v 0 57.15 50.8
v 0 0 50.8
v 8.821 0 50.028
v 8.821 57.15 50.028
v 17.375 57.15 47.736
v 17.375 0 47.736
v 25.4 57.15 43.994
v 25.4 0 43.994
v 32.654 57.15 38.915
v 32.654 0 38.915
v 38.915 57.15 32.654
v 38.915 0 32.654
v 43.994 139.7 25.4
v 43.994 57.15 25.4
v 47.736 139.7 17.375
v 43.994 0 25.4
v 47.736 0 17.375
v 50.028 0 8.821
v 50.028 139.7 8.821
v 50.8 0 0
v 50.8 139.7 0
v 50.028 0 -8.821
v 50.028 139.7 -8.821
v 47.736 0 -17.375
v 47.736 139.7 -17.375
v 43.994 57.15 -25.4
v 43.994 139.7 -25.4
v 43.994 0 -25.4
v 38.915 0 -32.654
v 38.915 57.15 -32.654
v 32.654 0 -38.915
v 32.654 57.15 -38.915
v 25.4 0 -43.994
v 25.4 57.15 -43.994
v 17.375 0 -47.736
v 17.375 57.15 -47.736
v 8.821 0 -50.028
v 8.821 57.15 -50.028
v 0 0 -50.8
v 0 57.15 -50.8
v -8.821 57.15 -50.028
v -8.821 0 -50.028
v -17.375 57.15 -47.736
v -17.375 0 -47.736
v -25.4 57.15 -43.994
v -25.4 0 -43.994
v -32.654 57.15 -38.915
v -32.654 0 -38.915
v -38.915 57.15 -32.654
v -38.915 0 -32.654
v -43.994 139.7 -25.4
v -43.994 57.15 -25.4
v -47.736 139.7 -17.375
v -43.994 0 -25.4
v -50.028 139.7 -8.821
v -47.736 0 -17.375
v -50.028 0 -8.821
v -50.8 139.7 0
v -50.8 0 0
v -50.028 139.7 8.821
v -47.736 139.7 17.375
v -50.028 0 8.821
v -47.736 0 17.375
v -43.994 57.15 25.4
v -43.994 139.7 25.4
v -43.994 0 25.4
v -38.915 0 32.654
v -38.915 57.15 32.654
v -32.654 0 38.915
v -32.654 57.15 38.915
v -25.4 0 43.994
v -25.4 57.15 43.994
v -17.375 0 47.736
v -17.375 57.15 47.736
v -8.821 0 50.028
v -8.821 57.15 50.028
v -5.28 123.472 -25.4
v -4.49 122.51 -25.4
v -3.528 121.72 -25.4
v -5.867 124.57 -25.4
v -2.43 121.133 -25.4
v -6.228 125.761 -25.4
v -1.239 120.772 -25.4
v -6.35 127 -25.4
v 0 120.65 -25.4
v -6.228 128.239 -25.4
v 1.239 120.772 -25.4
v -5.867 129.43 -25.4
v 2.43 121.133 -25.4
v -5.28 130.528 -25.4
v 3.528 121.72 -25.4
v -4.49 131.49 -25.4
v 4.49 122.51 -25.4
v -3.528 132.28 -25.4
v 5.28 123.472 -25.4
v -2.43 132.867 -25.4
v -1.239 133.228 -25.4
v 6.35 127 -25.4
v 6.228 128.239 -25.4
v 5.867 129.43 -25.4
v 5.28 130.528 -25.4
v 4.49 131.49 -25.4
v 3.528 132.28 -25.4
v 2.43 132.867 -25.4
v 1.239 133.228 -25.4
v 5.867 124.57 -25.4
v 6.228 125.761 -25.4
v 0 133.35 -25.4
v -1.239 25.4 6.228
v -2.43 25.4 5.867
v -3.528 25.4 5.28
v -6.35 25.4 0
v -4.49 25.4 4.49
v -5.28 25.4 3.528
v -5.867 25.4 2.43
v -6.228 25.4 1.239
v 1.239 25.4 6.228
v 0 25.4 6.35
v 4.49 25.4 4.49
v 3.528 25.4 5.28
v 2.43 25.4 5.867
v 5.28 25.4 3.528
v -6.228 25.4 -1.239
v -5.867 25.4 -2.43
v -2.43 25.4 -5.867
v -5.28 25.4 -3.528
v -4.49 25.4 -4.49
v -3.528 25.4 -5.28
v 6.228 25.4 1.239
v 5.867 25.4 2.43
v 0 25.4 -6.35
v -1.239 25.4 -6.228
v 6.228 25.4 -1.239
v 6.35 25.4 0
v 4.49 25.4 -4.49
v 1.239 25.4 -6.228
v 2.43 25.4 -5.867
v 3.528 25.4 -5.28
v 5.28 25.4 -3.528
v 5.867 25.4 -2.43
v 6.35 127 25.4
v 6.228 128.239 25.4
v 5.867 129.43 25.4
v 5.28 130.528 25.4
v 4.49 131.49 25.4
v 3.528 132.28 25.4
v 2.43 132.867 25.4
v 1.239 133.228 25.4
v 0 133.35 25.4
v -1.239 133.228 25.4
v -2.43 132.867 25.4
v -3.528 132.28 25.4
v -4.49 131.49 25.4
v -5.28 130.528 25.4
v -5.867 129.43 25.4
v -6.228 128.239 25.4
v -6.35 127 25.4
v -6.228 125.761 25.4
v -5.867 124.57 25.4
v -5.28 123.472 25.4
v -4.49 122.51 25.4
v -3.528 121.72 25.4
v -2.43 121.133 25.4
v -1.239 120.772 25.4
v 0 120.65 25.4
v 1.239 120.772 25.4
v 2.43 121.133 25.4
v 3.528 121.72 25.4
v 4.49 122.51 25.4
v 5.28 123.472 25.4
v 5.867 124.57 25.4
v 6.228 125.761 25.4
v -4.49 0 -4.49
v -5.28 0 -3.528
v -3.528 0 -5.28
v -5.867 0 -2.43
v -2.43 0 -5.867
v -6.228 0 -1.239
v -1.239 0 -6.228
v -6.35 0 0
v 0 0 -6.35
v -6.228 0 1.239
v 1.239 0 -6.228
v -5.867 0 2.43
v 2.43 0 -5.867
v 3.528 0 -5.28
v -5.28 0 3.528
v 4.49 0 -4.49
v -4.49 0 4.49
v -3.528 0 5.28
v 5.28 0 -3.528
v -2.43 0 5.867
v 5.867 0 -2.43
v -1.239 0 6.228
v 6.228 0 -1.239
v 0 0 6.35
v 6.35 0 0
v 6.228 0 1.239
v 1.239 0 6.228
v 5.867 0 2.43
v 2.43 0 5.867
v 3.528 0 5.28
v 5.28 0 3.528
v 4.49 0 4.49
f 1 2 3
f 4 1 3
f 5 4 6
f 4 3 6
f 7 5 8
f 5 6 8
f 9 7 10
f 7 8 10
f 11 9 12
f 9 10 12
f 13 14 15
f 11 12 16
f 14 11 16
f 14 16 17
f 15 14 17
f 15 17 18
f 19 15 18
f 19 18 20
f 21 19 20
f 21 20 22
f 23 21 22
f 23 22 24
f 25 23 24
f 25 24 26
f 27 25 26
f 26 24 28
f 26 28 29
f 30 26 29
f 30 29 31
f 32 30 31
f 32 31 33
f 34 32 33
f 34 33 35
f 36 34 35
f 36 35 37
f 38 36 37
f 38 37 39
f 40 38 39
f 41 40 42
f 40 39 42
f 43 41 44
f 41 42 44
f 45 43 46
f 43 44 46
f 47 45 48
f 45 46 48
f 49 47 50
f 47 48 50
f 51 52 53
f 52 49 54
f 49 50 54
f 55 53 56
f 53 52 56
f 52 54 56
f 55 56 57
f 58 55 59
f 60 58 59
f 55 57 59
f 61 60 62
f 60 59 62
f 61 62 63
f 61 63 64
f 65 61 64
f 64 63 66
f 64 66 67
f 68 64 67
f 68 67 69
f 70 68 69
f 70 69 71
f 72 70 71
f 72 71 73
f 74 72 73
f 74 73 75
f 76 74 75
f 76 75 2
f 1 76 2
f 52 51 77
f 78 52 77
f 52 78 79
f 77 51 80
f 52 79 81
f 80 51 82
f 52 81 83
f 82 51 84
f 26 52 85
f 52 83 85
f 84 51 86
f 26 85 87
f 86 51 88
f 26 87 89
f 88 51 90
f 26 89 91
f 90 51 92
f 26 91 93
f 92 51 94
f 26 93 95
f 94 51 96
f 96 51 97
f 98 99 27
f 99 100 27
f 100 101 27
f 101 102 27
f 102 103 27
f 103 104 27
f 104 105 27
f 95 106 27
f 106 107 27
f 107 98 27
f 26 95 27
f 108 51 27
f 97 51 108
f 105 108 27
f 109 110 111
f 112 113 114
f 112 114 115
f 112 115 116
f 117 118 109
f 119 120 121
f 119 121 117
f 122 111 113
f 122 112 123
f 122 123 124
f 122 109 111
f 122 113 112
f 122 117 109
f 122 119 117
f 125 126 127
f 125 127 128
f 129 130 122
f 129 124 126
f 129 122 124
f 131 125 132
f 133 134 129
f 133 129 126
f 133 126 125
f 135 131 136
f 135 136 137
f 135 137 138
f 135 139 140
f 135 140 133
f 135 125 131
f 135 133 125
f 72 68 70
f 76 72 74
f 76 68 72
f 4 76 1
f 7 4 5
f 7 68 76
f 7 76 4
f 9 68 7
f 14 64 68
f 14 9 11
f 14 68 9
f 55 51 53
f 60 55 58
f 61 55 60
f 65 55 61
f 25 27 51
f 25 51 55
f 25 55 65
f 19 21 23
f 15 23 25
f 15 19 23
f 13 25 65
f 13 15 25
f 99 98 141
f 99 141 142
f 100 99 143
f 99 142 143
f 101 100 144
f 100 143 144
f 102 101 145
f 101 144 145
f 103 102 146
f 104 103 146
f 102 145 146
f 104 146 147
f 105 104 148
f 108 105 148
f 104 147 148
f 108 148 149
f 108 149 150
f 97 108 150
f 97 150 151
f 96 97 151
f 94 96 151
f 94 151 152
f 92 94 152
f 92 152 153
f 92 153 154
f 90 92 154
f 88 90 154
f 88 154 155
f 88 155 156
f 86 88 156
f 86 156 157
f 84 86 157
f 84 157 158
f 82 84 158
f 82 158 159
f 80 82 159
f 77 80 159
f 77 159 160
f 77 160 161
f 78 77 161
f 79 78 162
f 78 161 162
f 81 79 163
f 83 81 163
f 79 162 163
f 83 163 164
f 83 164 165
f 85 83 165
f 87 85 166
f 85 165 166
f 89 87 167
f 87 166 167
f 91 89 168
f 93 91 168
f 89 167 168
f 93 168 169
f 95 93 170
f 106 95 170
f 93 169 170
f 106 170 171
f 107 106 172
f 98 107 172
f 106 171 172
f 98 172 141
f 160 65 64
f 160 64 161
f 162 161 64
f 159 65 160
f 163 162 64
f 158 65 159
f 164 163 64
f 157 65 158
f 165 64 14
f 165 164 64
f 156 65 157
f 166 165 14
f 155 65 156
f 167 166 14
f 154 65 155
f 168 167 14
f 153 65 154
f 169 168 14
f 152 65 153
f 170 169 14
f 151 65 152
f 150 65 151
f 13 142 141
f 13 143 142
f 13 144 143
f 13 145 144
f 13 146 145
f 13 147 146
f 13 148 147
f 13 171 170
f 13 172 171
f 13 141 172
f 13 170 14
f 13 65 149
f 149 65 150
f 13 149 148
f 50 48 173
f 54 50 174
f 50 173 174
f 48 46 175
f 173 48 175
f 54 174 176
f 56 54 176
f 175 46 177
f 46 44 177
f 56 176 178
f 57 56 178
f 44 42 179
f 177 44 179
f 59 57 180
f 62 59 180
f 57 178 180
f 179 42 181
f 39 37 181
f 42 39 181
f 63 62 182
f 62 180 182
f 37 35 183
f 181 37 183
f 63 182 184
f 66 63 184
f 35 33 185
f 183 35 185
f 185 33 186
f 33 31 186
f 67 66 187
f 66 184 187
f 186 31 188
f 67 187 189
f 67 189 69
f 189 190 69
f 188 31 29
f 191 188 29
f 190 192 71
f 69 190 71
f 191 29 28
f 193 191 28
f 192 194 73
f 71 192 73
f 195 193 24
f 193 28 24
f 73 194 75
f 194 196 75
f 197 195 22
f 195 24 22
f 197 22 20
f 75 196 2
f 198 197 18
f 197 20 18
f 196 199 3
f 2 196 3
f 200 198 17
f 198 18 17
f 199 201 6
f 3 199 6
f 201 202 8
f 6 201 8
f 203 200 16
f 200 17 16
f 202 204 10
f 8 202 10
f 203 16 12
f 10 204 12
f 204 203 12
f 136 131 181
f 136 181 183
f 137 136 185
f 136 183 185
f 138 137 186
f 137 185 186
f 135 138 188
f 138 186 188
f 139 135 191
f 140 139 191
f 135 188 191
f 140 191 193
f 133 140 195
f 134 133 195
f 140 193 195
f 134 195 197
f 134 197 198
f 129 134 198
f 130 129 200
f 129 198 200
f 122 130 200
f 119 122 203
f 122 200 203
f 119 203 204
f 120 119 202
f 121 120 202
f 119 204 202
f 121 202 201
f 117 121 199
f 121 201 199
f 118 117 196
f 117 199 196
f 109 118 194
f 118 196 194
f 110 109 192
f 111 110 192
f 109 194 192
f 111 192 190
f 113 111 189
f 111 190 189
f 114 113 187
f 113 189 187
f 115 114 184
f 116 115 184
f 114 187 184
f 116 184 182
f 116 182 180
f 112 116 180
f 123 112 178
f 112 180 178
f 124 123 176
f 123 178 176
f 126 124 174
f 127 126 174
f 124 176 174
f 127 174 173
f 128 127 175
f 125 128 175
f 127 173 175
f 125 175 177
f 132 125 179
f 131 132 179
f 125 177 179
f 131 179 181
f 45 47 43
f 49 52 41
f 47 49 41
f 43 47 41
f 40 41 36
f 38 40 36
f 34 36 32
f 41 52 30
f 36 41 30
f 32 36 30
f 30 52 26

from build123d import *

# Parameters (mm, degrees)
SKETCH1_R           = 50.8
BOSS_EXTRUDE1_DEPTH = 139.7
CUT_EXTRUDE1_START  = 25.4
SKETCH2_W           = 101.6
SKETCH2_H           = 165.1
CUT_EXTRUDE1_DEPTH  = 50.8
CUT_EXTRUDE2_START  = -25.4
SKETCH2_2_W         = 101.6
SKETCH2_2_H         = 165.1
CUT_EXTRUDE2_DEPTH  = 50.8
SKETCH3_R           = 6.35
CUT_EXTRUDE3_DEPTH  = 25.4
SKETCH4_R           = 6.35
CUT_EXTRUDE4_DEPTH  = 168.042419762


with BuildPart() as part:
    # Sketch1 → Boss-Extrude1 (new body)
    with BuildSketch(Plane(origin=(0, 0, 0), x_dir=(1, 0, 0), z_dir=(0, 1, 0))):
        Circle(SKETCH1_R)
    extrude(amount=BOSS_EXTRUDE1_DEPTH)

    # Sketch2 → Cut-Extrude1 (cut)
    with BuildSketch(Plane.XY.offset(CUT_EXTRUDE1_START)):
        with Locations((0, 139.7)):
            Rectangle(SKETCH2_W, SKETCH2_H)
    extrude(amount=CUT_EXTRUDE1_DEPTH, mode=Mode.SUBTRACT)

    # Sketch2<2> → Cut-Extrude2 (cut)
    with BuildSketch(Plane.XY.offset(CUT_EXTRUDE2_START)):
        with Locations((0, 139.7)):
            Rectangle(SKETCH2_2_W, SKETCH2_2_H)
    extrude(amount=-CUT_EXTRUDE2_DEPTH, mode=Mode.SUBTRACT)

    # Sketch3 → Cut-Extrude3 (cut)
    with BuildSketch(Plane.XZ):
        Circle(SKETCH3_R)
    extrude(amount=-CUT_EXTRUDE3_DEPTH, mode=Mode.SUBTRACT)

    # Sketch4 → Cut-Extrude4 (cut, through all)
    with BuildSketch(Plane.XY.offset(25.4)):
        with Locations((0, 127)):
            Circle(SKETCH4_R)
    extrude(amount=-CUT_EXTRUDE4_DEPTH, mode=Mode.SUBTRACT)


solid = part.part
